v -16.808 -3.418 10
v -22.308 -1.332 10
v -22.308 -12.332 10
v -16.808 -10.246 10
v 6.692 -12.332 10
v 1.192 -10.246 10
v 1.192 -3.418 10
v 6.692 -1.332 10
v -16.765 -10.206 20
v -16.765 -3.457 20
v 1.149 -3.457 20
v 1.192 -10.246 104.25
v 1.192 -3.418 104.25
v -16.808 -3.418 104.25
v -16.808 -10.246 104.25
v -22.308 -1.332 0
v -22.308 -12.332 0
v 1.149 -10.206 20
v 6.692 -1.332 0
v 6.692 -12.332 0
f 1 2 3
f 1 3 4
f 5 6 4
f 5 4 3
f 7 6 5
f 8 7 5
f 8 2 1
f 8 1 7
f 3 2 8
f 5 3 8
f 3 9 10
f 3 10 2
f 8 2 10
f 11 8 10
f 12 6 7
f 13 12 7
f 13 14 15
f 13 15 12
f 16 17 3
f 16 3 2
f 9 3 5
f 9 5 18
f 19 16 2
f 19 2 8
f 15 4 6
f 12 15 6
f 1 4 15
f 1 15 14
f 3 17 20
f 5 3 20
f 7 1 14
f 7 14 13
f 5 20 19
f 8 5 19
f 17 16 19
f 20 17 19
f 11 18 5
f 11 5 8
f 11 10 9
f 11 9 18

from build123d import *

# Parameters (mm, degrees)
CROQUIS1_W              = 29
CROQUIS1_H              = 11
SALIENTE_EXTRUIR1_DEPTH = 10
CROQUIS2_W              = 18
CROQUIS2_H              = 6.827586207
SALIENTE_EXTRUIR2_DEPTH = 94.25
CROQUIS3_W              = 29
CROQUIS3_H              = 11
SALIENTE_EXTRUIR5_DEPTH = 10
CHAFL_N1_SIZE           = 10
CHAFL_N1_SIZE_2         = 2.125565617
CHAFL_N2_SIZE           = 10
CHAFL_N2_SIZE_2         = 2.125565617
CHAFL_N6_SIZE2          = 5.543090515
CHAFL_N6_SIZE           = 10
CHAFL_N7_SIZE           = 5.543090515
CHAFL_N7_SIZE_2         = 10


# Some blends are built 0.0001 mm under size
with BuildPart() as part:
    # Croquis1 → Saliente-Extruir1 (new body)
    with BuildSketch(Plane.XY):
        with Locations((-7.808491758, -6.83172232)):
            Rectangle(CROQUIS1_W, CROQUIS1_H)
    extrude(amount=SALIENTE_EXTRUIR1_DEPTH)

    # Croquis2 → Saliente-Extruir2 (add)
    with BuildSketch(Plane.XY.offset(10)):
        with Locations((-7.808491758, -6.83172232)):
            Rectangle(CROQUIS2_W, CROQUIS2_H)
    extrude(amount=SALIENTE_EXTRUIR2_DEPTH)


with BuildPart() as body_2:
    # Croquis3 → Saliente-Extruir5 (new body)
    with BuildSketch(Plane.XY.offset(10)):
        with Locations((-7.808491758, -6.83172232)):
            Rectangle(CROQUIS3_W, CROQUIS3_H)
    extrude(amount=SALIENTE_EXTRUIR5_DEPTH)

    # Chaflán1
    # the kernel refuses this chamfer: 10, 2.125565617 mm, written as the material it takes off along each edge
    with BuildSketch(Plane(origin=(32.670487822, -12.33172232, 20), x_dir=(0, -0.008003073799517237, -0.999967974892076), z_dir=(-1, 0, 0))) as chafl_n1_piece_1:
        Polygon((CHAFL_N1_SIZE * 0.999967974892, -CHAFL_N1_SIZE * 0.00800307379952), (-CHAFL_N1_SIZE_2 * 0.00800307379839, -CHAFL_N1_SIZE_2 * 0.999967974751), (0, 0), align=None)
    extrude(amount=80.957959161, mode=Mode.SUBTRACT)

    # Chaflán2
    # the kernel refuses this chamfer: 10, 2.125565617 mm, written as the material it takes off along each edge
    with BuildSketch(Plane(origin=(-48.287471339, -1.33172232, 20), x_dir=(0, 0.008003073799517172, -0.999967974892076), z_dir=(1, 0, 0))) as chafl_n2_piece_1:
        Polygon((CHAFL_N2_SIZE * 0.999967974892, -CHAFL_N2_SIZE * 0.00800307379952), (-CHAFL_N2_SIZE_2 * 0.00800307379839, -CHAFL_N2_SIZE_2 * 0.999967974751), (0, 0), align=None)
    extrude(amount=80.957959161, mode=Mode.SUBTRACT)

    # Chaflán6
    chafl_n6_edges = [body_2.edges().sort_by_distance(p)[0] for p in [
        (6.691508242, -6.83172232, 20),
    ]]
    chafl_n6_side = [body_2.faces().sort_by_distance(p)[0] for p in [
        (6.691508242, -6.83172232, 19.88913819),
    ]]
    chamfer(chafl_n6_edges, length=CHAFL_N6_SIZE - 0.0001, length2=CHAFL_N6_SIZE2 - 0.0001, reference=chafl_n6_side[0])  # a hair under: the kernel refuses the full size

    # Chaflán7
    # the kernel refuses this chamfer: 10, 5.543090515 mm, written as the material it takes off along each edge
    with BuildSketch(Plane(origin=(-22.308491758, -36.085317921, 20), x_dir=(0.9981458389905736, 0, 0.06086775916528887), z_dir=(0, 1, 0))) as chafl_n7_piece_1:
        Polygon((CHAFL_N7_SIZE * 0.998145838906, CHAFL_N7_SIZE * 0.0608677591601), (-CHAFL_N7_SIZE_2 * 0.0608677591653, CHAFL_N7_SIZE_2 * 0.998145838991), (0, 0), align=None)
    extrude(amount=58.507191203, mode=Mode.SUBTRACT)


solid = Compound([part.part, body_2.part])
